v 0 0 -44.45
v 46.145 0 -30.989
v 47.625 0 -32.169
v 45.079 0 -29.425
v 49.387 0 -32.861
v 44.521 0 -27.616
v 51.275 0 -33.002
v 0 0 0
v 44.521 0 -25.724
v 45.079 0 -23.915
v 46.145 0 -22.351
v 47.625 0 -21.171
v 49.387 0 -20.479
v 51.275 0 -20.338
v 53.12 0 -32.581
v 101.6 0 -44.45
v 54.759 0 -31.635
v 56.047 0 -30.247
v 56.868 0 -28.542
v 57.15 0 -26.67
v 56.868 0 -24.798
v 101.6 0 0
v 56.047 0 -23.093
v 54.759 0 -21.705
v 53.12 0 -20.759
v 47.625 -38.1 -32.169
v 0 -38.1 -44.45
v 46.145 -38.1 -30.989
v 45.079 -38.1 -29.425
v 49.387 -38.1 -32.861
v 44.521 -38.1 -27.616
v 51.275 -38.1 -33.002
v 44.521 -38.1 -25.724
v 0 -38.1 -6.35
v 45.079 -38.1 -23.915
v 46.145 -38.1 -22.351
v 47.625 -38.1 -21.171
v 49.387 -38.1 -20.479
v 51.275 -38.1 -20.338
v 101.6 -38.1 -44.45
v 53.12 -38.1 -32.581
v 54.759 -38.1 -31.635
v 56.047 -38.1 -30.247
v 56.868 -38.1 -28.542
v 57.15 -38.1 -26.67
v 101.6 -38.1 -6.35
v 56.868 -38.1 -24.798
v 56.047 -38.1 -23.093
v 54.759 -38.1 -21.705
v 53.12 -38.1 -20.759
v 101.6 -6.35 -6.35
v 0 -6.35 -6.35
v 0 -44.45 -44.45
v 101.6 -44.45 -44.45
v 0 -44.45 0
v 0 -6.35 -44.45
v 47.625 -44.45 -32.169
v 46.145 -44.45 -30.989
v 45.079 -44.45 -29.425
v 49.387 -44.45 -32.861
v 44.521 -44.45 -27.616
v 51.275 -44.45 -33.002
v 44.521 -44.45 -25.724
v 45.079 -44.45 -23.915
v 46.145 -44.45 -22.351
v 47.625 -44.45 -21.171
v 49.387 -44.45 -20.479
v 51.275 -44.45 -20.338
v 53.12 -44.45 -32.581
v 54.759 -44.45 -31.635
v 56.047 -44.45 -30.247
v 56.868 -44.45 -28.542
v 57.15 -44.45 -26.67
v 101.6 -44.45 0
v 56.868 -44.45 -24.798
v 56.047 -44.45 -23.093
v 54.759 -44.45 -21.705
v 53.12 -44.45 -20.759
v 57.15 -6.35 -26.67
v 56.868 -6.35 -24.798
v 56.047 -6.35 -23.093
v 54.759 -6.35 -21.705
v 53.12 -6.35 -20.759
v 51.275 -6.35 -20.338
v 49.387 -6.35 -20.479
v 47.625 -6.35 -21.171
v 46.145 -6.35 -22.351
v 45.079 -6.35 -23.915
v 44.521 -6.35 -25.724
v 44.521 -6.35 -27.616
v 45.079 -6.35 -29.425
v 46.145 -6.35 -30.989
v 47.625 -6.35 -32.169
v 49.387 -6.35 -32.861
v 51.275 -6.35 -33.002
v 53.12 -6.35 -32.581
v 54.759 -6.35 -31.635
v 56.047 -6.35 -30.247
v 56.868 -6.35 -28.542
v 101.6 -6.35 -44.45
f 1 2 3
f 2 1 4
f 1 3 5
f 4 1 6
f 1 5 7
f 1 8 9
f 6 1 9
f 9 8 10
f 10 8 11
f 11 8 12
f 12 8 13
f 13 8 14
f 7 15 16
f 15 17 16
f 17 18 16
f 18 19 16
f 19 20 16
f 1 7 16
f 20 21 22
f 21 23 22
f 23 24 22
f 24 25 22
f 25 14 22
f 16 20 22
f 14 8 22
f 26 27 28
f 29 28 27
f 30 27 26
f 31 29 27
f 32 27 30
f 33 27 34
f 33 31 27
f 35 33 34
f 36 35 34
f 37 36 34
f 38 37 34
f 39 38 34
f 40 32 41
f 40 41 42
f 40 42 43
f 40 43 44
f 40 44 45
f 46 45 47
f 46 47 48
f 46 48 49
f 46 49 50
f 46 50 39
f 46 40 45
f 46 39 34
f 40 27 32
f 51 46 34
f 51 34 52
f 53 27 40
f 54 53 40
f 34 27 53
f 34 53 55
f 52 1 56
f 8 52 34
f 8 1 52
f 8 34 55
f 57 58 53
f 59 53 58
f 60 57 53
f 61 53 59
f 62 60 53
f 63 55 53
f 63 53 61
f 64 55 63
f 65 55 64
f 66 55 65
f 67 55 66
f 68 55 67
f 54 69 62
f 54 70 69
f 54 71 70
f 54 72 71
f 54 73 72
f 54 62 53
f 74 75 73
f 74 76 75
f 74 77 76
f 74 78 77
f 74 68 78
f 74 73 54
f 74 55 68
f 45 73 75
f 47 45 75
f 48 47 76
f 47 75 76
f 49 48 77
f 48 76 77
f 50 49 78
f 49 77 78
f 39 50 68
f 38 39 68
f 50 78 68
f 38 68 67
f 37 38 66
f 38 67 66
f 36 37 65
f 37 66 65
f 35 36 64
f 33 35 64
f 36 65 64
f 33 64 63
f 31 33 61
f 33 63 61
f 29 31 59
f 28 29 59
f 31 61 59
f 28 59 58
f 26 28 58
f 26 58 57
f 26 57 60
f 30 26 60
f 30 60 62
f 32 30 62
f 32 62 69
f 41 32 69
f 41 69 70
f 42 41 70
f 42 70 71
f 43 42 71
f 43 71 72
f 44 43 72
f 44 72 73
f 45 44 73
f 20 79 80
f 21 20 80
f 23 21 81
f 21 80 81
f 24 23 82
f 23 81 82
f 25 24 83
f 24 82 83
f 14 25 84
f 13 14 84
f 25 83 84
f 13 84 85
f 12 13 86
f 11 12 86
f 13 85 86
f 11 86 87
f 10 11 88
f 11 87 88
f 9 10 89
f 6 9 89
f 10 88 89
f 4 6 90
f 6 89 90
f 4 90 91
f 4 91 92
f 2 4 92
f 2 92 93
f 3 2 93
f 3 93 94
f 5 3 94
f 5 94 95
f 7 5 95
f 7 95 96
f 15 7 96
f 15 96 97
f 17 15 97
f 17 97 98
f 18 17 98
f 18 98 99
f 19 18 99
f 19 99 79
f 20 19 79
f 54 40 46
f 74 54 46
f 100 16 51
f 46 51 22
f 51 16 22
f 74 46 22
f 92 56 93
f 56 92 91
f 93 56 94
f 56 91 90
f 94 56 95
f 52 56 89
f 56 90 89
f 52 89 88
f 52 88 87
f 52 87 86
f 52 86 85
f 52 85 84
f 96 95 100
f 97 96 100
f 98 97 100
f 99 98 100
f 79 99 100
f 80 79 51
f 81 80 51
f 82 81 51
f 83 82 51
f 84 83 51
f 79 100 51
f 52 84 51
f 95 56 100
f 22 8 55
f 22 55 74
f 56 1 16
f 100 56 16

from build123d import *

# Parameters (mm, degrees)
F0_W     = 101.6
F0_H     = 44.45
F1_DEPTH = 44.45
F2_W     = 31.75
F2_H     = 38.1
F3_DEPTH = 101.601
F4_R     = 6.35
F5_DEPTH = 44.451


with BuildPart() as f1:
    # F0 (on Front) → F1 (new body)
    with BuildSketch(Plane.XZ):
        with Locations((50.8, -22.225)):
            Rectangle(F0_W, F0_H)
    extrude(amount=F1_DEPTH)

    # F2 (on face) → F3 (cut, through all)
    with BuildSketch(Plane.YZ.offset(101.6)):
        with Locations((-22.225, -25.4)):
            Rectangle(F2_W, F2_H)
    extrude(amount=-F3_DEPTH, mode=Mode.SUBTRACT)

    # F4 (on face) → F5 (cut, through all)
    with BuildSketch(Plane.XZ.offset(44.45)):
        with Locations((50.8, -26.67)):
            Circle(F4_R)
    extrude(amount=-F5_DEPTH, mode=Mode.SUBTRACT)


solid = f1.part
